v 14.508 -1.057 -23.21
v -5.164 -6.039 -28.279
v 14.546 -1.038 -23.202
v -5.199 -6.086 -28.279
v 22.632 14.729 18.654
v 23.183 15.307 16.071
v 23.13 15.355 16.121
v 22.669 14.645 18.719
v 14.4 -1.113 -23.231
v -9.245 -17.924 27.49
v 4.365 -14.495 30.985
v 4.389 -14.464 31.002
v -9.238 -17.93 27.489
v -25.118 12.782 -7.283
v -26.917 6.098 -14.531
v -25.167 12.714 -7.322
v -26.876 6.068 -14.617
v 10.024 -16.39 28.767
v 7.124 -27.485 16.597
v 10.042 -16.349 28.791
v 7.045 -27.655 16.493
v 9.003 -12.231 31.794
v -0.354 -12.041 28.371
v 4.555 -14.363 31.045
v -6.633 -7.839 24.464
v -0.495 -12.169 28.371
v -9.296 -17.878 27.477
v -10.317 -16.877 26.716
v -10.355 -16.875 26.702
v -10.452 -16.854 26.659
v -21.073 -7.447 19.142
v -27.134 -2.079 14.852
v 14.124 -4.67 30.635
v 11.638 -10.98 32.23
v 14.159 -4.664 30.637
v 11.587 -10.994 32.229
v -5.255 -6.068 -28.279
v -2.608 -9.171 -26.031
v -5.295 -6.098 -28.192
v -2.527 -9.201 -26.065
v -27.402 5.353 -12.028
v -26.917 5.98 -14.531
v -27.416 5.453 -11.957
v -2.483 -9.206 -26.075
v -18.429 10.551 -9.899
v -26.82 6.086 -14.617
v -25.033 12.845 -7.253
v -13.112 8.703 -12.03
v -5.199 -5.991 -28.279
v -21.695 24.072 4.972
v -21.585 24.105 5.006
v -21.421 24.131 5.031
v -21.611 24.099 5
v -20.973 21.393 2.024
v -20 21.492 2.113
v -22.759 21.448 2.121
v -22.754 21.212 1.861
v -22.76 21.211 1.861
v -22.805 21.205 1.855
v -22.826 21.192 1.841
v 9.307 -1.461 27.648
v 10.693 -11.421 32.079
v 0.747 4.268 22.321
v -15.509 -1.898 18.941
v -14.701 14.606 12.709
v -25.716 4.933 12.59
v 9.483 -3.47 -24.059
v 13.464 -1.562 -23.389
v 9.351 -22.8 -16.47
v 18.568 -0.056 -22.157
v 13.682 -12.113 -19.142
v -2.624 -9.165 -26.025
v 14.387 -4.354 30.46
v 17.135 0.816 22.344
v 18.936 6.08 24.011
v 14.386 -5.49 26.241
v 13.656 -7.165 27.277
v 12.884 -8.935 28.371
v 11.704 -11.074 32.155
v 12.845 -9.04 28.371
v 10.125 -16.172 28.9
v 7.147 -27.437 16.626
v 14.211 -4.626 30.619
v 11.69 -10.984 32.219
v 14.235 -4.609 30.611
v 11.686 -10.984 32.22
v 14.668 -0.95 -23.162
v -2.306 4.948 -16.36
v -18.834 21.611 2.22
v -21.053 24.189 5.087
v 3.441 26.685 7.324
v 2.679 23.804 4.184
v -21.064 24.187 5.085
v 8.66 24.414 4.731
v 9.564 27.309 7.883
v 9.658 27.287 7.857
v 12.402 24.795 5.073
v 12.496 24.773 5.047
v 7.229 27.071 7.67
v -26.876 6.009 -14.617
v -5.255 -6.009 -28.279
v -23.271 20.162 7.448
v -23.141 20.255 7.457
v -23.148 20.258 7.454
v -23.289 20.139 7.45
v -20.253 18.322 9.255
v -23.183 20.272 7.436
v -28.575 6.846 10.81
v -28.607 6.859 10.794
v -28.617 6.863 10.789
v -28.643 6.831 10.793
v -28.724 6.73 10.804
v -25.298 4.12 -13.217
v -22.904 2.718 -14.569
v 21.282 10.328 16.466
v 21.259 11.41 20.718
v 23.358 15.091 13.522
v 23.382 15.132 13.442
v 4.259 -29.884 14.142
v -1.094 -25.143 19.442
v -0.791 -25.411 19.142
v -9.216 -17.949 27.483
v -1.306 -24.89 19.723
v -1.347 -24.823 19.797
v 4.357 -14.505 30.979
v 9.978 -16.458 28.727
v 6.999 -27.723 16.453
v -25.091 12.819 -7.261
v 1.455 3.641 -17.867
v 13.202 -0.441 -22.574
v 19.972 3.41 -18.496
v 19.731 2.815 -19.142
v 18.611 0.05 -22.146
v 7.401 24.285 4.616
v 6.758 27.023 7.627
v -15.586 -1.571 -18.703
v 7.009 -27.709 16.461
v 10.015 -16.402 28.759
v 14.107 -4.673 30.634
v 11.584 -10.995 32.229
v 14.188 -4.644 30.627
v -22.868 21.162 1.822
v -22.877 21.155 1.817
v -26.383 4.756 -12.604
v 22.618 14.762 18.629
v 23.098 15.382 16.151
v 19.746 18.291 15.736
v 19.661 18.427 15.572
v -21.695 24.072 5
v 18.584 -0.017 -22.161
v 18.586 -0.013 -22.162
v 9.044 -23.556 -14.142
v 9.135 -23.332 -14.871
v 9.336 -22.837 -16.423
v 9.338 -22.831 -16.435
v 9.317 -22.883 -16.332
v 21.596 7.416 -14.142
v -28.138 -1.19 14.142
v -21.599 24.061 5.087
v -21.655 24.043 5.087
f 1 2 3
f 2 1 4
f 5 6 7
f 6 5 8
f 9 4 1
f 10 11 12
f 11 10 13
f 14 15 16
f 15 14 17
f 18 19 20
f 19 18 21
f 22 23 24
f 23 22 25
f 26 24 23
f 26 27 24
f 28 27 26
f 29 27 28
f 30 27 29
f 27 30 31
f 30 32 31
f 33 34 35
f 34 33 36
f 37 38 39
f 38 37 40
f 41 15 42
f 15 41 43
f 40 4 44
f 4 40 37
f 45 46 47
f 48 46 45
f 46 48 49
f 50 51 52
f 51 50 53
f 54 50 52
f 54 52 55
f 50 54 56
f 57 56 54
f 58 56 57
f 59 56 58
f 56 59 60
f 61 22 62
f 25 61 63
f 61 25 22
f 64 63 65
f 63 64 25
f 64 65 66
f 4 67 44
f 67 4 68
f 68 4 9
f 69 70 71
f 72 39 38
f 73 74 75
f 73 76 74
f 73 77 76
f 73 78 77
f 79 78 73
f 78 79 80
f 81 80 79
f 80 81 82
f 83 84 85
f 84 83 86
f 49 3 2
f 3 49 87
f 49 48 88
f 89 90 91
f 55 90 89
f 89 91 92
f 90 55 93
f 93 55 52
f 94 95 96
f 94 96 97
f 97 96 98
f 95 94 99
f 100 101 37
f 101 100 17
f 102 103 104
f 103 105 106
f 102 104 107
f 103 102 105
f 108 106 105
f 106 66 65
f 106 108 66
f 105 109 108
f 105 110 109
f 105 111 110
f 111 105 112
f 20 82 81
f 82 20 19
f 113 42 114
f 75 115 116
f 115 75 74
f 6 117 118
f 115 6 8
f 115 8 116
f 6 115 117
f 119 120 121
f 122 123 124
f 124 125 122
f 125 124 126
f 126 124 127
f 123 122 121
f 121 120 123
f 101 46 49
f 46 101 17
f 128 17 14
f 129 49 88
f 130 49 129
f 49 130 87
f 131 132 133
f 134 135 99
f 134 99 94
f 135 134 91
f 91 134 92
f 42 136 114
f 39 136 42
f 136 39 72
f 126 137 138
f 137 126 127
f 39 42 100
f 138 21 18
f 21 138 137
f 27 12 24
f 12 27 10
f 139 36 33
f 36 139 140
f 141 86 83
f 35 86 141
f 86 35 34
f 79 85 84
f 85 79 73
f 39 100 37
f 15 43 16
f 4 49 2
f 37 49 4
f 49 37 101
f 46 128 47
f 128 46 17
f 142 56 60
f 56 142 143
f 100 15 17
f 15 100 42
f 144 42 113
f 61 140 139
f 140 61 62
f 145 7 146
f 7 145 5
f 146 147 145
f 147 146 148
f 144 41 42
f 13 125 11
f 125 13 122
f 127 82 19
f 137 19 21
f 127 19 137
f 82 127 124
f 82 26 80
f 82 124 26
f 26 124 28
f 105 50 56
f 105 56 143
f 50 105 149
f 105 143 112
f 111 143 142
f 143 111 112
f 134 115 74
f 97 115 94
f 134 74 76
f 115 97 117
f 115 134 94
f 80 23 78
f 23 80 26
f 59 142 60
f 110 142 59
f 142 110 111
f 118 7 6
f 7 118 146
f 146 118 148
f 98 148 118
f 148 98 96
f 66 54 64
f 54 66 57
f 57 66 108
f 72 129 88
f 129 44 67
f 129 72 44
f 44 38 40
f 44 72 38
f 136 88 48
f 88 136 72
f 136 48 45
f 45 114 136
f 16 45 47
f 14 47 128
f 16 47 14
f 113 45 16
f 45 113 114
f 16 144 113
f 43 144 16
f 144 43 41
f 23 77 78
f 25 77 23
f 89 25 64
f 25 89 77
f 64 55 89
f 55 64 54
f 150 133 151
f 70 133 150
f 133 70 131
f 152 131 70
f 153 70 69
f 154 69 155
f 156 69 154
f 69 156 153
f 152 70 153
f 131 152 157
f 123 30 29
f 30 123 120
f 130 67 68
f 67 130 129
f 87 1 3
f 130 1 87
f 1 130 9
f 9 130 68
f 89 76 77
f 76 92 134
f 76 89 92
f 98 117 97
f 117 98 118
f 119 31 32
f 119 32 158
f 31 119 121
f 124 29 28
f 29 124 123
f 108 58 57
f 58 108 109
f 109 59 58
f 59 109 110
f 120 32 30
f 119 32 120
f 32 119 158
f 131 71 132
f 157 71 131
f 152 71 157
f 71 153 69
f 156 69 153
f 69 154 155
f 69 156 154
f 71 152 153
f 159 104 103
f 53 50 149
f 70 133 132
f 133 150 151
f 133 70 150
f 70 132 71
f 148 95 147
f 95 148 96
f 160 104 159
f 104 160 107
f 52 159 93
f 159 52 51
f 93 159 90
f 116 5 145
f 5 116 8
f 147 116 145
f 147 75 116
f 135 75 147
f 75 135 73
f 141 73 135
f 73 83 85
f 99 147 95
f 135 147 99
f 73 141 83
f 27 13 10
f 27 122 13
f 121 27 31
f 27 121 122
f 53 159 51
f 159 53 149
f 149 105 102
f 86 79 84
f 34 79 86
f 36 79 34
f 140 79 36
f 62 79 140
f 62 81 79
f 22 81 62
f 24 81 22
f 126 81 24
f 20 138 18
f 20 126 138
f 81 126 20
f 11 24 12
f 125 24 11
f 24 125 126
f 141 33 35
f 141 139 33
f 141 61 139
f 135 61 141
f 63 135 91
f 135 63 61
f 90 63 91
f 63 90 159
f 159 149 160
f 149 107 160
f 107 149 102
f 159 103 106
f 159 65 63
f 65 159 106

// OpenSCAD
// Auto-generated OpenSCAD file

    shift = 4;

    inner_points = 10*[[1.5058415524902728, -0.8469090122267284, 2.828427124745977], [0.5858268155911234, -3.1170572197040873, 1.4142135623814647], [-1.247817861177845, -1.492942938206595, 2.8284271247519825], [2.425856289385377, 1.423239195241576, 1.4142135623642988], [0.5858268155870788, -3.117057219713142, -1.414213562364725], [-3.0814625379508573, 0.1311713432818428, 1.414213562376311], [-1.247817861185934, -1.4929429382247037, -2.8284271247403967], [-2.1614478010557527, 2.4013195507501472, -5.366929123340469e-12], [2.4258562893813322, 1.4232391952325214, -1.4142135623818908], [-3.0814625379549025, 0.13117134327278826, -1.4142135623698793], [0.5922116126123643, 3.047353476730014, -1.1372902619655179e-11], [1.5058415524821833, -0.8469090122448373, -2.828427124746403]];

    outer_points_unshifted = 10*[[-2.1858078515940984, 2.4865539480577854, 0.19822587951080473], [-3.206819726707762, -0.07104928703172886, 0.8433618672967396], [-2.683563110500327, 0.6038761652565141, -1.8530576377967574], [0.474098710093115, 3.1614794003460287, 0.8833336936151375], [-1.5679250401342106, -1.953727069833, 2.1736056691870065], [-0.5214118077193417, -0.6038761652565141, -3.2192333409999865], [0.5942262626467746, -3.1614794003460287, 0.8074299659837771], [2.138494753967872, 0.07104928703172886, -2.534125526895654], [2.1129933966666656, 1.2788016175447572, 2.2135774955054046], [1.1174828788542088, -2.4865539480577854, -1.8889895391097193], [2.6362500128741004, 1.953727069833, -0.48284200958809187], [1.091981521553003, -1.2788016175447572, 2.8587134832913392]];
    
    outer_points = [for (p = outer_points_unshifted) [p[0], p[1], p[2] + shift]];

    // Convex hull for inner set (I)
    module inner_hull() {
        hull() {
            for (p = inner_points) {
                translate(p) sphere(r=0.1);
            }
        }
    }

    // Convex hull for outer set (O) minus inner hull (O \ I)
    module outer_minus_inner() {
        difference() {
            hull() {
                for (p = outer_points) {
                    translate(p) sphere(r=0.1);
                }
            }
            inner_hull(); // Subtract inner hull
        }
    }

    // Convex hull for outer set (O) minus all translated inner hulls
    module outer_minus_AllTranslationInner() {
        difference() {
            hull() {
                for (p = outer_points) {
                    translate(p) sphere(r=0.1);
                }
            }
            hull() {
                translate([0,0,5]) inner_hull();
                translate([0,0,-5]) inner_hull();
            }; // Subtract translated inner hulls
        }
    }

    // Difference between outer_minus_inner and outer_minus_AllTranslationInner
    module outer_minus_inner_diff() {
        difference() {
            // Outer minus inner
            difference() {
                hull() {
                    for (p = outer_points) {
                        translate(p) sphere(r=0.1);
                    }
                }
                inner_hull();
            }

            // Subtract Outer minus AllTranslationInner
            difference() {
                hull() {
                    for (p = outer_points) {
                        translate(p) sphere(r=0.1);
                    }
                }
                hull() {
                    translate([0,0,5]) inner_hull();
                    translate([0,0,-5]) inner_hull();
                };
            }
        }
    }

    // Rendering all with colors applied
    // color([1, 0, 0, 0.5]) inner_hull(); // Transparent red
    // color([0, 1, 0, 1]) outer_minus_AllTranslationInner(); // Opaque green
    color([1, 1, 0, 1]) outer_minus_inner_diff(); // Opaque yellow
    
